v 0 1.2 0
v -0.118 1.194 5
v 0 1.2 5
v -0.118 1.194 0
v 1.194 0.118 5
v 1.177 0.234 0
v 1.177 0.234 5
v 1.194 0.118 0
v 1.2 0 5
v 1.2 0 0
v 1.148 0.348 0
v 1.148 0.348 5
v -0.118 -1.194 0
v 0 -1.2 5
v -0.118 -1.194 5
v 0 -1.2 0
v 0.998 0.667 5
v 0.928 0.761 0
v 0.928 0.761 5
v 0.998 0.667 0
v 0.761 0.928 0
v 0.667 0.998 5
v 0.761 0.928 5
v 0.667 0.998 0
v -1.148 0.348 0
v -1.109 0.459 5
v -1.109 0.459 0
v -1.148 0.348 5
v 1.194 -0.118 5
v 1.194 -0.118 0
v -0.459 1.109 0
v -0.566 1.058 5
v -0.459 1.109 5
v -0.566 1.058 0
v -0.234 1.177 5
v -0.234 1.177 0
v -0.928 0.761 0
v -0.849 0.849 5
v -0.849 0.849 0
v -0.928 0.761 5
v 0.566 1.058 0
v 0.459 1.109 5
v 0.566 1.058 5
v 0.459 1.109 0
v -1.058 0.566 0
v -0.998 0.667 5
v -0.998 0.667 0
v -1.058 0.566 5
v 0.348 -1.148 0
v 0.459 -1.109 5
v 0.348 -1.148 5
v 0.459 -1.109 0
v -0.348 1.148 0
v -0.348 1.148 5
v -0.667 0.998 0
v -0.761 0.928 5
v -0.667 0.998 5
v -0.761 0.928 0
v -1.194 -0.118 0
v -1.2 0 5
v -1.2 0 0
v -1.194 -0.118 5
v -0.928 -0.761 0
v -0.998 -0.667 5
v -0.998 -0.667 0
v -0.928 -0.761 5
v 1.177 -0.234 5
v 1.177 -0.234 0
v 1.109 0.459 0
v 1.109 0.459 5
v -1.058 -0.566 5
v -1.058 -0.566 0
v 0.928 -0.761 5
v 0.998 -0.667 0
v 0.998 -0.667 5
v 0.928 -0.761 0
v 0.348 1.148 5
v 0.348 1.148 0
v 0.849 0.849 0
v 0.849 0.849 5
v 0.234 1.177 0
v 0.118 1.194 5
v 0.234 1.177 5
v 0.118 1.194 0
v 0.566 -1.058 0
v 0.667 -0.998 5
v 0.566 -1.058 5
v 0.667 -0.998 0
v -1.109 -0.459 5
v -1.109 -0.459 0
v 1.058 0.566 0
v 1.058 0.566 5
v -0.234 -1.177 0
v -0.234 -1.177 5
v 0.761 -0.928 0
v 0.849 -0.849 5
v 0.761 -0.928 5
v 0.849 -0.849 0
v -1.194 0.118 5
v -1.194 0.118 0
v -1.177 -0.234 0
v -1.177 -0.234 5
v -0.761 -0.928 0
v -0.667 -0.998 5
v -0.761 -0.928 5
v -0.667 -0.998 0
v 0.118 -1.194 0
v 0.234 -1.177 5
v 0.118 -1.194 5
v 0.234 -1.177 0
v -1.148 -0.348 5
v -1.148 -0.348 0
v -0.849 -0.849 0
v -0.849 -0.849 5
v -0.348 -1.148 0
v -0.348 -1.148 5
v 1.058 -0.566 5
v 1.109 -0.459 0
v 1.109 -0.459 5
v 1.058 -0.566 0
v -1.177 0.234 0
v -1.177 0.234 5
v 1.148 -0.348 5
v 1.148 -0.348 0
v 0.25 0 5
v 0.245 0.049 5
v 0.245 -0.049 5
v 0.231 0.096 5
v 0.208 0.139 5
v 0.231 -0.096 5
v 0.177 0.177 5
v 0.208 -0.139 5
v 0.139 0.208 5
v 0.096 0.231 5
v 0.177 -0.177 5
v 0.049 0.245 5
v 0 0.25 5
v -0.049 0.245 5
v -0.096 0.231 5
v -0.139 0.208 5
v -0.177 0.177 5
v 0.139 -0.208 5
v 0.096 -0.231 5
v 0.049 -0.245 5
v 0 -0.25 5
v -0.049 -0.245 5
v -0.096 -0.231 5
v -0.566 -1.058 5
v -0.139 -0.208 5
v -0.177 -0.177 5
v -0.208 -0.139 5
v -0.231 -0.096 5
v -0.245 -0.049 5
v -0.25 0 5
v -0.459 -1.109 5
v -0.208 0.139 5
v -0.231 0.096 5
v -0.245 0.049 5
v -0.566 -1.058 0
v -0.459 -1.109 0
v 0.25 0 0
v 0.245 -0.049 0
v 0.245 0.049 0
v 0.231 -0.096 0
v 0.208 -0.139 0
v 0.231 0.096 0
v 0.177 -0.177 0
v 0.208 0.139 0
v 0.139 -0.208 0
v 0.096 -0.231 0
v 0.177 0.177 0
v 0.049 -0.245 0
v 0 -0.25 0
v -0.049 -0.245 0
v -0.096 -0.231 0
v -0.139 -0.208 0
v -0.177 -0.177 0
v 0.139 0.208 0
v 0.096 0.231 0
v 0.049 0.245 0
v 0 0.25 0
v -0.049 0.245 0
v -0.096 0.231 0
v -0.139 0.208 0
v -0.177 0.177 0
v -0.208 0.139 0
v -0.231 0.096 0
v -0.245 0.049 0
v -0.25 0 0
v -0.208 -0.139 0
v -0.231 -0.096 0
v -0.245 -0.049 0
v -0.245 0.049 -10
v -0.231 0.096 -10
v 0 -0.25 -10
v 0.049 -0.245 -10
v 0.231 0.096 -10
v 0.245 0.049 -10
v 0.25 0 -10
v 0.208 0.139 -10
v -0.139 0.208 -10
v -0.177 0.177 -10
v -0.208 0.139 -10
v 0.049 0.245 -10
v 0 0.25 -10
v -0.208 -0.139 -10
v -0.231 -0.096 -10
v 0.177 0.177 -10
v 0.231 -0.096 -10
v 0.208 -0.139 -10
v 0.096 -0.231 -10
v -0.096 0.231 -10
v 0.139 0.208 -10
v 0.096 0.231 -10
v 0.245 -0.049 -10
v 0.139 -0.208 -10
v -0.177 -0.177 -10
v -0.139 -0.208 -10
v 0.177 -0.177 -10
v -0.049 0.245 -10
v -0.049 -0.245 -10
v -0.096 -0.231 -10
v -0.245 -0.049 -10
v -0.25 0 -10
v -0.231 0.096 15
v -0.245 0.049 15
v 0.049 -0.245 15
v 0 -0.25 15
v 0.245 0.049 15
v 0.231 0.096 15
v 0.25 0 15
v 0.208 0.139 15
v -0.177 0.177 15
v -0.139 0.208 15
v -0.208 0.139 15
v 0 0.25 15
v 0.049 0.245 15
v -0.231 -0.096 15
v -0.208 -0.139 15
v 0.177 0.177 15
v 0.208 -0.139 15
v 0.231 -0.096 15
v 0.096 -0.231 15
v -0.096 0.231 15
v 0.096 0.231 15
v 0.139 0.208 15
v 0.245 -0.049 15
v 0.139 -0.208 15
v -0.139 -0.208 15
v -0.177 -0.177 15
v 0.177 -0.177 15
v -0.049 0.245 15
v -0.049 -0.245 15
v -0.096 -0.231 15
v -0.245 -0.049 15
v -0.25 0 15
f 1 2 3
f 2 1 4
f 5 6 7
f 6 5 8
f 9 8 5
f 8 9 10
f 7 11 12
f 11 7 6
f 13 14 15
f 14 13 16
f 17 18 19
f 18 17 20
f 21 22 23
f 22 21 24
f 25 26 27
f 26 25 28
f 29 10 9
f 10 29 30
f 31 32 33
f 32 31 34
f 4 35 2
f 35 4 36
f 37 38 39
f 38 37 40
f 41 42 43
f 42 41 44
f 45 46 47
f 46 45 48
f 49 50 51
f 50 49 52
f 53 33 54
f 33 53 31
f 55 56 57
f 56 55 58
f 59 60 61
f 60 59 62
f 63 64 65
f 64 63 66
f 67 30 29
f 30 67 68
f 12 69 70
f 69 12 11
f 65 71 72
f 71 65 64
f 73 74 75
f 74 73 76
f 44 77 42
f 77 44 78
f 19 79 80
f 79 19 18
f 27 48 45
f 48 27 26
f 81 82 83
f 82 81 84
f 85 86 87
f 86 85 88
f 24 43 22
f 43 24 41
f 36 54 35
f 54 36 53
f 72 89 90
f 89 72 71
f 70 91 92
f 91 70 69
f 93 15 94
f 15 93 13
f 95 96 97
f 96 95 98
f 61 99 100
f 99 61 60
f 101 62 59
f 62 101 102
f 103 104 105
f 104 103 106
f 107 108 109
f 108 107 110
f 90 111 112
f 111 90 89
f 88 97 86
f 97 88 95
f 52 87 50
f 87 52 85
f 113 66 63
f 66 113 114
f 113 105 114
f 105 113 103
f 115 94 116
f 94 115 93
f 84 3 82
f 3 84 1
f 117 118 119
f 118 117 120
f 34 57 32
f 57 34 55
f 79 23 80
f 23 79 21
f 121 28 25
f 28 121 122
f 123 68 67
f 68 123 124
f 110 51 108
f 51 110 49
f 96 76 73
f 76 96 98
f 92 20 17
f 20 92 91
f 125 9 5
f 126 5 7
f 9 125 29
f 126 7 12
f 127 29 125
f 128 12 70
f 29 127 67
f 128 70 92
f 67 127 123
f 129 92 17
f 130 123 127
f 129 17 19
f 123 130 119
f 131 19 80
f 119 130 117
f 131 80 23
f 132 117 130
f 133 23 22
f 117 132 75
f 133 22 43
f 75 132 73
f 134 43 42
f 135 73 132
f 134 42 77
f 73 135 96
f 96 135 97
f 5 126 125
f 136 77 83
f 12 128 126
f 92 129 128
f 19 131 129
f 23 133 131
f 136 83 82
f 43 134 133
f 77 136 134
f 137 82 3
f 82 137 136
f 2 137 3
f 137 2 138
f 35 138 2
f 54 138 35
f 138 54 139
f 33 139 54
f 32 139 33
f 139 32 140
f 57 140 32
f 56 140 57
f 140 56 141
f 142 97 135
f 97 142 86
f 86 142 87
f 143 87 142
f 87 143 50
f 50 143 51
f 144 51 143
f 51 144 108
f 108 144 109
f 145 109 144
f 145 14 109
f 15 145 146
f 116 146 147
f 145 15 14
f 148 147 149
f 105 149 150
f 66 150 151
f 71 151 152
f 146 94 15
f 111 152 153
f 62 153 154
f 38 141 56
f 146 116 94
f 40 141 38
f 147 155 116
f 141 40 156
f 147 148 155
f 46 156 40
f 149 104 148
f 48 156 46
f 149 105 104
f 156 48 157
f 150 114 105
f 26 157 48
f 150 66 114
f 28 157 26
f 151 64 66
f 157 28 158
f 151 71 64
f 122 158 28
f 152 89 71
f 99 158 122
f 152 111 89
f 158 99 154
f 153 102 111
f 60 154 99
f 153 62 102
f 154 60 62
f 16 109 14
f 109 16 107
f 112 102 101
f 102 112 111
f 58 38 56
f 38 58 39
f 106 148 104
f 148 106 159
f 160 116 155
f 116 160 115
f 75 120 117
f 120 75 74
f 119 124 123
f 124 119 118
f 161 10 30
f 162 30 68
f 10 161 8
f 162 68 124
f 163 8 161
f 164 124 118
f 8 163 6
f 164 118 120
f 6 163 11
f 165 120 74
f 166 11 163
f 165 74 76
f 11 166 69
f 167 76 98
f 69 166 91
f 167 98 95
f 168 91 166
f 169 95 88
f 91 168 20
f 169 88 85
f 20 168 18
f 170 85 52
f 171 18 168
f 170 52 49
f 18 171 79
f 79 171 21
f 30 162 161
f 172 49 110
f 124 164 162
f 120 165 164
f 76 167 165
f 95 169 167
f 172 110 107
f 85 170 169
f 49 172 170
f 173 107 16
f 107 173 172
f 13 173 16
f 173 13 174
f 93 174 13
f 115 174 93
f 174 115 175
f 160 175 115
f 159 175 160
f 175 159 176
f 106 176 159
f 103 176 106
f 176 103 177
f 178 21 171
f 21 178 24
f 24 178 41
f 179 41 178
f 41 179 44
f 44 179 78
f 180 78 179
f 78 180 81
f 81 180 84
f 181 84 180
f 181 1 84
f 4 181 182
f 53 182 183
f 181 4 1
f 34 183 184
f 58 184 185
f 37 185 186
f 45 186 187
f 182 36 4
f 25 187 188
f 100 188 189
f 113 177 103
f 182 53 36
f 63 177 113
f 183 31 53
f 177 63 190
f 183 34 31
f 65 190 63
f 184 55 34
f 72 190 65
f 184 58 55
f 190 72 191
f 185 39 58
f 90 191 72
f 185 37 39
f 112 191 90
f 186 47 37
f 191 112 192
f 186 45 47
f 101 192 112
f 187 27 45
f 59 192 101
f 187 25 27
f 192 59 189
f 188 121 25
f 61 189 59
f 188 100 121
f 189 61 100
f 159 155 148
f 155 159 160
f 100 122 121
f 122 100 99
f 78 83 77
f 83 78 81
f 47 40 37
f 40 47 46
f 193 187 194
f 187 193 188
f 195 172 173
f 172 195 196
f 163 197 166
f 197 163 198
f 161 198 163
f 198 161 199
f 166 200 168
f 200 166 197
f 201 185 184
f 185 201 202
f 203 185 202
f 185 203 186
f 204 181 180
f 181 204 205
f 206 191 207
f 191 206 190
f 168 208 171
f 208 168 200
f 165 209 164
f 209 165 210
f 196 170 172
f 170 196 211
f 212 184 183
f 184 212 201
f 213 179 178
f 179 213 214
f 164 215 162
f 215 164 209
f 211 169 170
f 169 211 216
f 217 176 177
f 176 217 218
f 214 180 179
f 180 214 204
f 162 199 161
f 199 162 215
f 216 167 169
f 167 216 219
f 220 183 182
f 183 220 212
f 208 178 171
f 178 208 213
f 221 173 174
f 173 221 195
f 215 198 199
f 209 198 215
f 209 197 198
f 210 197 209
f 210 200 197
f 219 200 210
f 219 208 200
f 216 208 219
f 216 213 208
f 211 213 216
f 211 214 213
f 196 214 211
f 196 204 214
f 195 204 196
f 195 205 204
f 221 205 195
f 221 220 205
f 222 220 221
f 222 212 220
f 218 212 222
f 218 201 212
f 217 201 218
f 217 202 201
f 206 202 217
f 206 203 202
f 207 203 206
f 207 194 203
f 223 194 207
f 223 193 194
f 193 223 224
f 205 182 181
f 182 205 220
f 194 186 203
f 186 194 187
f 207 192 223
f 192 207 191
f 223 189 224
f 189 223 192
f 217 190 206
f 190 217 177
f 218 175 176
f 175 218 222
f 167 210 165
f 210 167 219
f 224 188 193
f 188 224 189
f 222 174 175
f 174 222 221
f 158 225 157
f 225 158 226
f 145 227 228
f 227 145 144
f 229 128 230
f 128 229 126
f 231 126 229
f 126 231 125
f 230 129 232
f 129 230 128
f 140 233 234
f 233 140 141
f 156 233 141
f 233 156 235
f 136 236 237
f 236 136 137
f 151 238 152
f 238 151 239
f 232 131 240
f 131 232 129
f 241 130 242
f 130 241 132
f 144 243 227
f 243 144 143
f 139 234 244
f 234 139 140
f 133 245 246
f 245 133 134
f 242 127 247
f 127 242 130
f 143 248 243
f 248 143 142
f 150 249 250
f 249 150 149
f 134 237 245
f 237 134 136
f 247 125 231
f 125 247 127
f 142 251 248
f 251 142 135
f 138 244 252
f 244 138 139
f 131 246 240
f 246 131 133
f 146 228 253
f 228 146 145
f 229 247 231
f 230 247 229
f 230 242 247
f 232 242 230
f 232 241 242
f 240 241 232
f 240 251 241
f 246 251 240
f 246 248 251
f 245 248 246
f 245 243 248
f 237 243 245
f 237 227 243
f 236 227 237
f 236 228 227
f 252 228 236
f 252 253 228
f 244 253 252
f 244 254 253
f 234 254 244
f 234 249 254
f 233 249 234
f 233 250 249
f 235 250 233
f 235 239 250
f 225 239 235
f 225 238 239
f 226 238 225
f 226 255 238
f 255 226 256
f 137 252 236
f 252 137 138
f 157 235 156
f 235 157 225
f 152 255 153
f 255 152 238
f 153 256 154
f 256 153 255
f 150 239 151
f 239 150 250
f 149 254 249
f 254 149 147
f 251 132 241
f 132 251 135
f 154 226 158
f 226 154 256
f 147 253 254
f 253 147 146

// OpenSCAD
module thermistor() {
    // Main body of the thermistor
    cylinder(h=5, d=2.4, $fn=64);

    // Leads of the thermistor
    translate([0, 0, -10])
        cylinder(h=10, d=0.5, $fn=32);
    translate([0, 0, 5])
        cylinder(h=10, d=0.5, $fn=32);
}

thermistor();
